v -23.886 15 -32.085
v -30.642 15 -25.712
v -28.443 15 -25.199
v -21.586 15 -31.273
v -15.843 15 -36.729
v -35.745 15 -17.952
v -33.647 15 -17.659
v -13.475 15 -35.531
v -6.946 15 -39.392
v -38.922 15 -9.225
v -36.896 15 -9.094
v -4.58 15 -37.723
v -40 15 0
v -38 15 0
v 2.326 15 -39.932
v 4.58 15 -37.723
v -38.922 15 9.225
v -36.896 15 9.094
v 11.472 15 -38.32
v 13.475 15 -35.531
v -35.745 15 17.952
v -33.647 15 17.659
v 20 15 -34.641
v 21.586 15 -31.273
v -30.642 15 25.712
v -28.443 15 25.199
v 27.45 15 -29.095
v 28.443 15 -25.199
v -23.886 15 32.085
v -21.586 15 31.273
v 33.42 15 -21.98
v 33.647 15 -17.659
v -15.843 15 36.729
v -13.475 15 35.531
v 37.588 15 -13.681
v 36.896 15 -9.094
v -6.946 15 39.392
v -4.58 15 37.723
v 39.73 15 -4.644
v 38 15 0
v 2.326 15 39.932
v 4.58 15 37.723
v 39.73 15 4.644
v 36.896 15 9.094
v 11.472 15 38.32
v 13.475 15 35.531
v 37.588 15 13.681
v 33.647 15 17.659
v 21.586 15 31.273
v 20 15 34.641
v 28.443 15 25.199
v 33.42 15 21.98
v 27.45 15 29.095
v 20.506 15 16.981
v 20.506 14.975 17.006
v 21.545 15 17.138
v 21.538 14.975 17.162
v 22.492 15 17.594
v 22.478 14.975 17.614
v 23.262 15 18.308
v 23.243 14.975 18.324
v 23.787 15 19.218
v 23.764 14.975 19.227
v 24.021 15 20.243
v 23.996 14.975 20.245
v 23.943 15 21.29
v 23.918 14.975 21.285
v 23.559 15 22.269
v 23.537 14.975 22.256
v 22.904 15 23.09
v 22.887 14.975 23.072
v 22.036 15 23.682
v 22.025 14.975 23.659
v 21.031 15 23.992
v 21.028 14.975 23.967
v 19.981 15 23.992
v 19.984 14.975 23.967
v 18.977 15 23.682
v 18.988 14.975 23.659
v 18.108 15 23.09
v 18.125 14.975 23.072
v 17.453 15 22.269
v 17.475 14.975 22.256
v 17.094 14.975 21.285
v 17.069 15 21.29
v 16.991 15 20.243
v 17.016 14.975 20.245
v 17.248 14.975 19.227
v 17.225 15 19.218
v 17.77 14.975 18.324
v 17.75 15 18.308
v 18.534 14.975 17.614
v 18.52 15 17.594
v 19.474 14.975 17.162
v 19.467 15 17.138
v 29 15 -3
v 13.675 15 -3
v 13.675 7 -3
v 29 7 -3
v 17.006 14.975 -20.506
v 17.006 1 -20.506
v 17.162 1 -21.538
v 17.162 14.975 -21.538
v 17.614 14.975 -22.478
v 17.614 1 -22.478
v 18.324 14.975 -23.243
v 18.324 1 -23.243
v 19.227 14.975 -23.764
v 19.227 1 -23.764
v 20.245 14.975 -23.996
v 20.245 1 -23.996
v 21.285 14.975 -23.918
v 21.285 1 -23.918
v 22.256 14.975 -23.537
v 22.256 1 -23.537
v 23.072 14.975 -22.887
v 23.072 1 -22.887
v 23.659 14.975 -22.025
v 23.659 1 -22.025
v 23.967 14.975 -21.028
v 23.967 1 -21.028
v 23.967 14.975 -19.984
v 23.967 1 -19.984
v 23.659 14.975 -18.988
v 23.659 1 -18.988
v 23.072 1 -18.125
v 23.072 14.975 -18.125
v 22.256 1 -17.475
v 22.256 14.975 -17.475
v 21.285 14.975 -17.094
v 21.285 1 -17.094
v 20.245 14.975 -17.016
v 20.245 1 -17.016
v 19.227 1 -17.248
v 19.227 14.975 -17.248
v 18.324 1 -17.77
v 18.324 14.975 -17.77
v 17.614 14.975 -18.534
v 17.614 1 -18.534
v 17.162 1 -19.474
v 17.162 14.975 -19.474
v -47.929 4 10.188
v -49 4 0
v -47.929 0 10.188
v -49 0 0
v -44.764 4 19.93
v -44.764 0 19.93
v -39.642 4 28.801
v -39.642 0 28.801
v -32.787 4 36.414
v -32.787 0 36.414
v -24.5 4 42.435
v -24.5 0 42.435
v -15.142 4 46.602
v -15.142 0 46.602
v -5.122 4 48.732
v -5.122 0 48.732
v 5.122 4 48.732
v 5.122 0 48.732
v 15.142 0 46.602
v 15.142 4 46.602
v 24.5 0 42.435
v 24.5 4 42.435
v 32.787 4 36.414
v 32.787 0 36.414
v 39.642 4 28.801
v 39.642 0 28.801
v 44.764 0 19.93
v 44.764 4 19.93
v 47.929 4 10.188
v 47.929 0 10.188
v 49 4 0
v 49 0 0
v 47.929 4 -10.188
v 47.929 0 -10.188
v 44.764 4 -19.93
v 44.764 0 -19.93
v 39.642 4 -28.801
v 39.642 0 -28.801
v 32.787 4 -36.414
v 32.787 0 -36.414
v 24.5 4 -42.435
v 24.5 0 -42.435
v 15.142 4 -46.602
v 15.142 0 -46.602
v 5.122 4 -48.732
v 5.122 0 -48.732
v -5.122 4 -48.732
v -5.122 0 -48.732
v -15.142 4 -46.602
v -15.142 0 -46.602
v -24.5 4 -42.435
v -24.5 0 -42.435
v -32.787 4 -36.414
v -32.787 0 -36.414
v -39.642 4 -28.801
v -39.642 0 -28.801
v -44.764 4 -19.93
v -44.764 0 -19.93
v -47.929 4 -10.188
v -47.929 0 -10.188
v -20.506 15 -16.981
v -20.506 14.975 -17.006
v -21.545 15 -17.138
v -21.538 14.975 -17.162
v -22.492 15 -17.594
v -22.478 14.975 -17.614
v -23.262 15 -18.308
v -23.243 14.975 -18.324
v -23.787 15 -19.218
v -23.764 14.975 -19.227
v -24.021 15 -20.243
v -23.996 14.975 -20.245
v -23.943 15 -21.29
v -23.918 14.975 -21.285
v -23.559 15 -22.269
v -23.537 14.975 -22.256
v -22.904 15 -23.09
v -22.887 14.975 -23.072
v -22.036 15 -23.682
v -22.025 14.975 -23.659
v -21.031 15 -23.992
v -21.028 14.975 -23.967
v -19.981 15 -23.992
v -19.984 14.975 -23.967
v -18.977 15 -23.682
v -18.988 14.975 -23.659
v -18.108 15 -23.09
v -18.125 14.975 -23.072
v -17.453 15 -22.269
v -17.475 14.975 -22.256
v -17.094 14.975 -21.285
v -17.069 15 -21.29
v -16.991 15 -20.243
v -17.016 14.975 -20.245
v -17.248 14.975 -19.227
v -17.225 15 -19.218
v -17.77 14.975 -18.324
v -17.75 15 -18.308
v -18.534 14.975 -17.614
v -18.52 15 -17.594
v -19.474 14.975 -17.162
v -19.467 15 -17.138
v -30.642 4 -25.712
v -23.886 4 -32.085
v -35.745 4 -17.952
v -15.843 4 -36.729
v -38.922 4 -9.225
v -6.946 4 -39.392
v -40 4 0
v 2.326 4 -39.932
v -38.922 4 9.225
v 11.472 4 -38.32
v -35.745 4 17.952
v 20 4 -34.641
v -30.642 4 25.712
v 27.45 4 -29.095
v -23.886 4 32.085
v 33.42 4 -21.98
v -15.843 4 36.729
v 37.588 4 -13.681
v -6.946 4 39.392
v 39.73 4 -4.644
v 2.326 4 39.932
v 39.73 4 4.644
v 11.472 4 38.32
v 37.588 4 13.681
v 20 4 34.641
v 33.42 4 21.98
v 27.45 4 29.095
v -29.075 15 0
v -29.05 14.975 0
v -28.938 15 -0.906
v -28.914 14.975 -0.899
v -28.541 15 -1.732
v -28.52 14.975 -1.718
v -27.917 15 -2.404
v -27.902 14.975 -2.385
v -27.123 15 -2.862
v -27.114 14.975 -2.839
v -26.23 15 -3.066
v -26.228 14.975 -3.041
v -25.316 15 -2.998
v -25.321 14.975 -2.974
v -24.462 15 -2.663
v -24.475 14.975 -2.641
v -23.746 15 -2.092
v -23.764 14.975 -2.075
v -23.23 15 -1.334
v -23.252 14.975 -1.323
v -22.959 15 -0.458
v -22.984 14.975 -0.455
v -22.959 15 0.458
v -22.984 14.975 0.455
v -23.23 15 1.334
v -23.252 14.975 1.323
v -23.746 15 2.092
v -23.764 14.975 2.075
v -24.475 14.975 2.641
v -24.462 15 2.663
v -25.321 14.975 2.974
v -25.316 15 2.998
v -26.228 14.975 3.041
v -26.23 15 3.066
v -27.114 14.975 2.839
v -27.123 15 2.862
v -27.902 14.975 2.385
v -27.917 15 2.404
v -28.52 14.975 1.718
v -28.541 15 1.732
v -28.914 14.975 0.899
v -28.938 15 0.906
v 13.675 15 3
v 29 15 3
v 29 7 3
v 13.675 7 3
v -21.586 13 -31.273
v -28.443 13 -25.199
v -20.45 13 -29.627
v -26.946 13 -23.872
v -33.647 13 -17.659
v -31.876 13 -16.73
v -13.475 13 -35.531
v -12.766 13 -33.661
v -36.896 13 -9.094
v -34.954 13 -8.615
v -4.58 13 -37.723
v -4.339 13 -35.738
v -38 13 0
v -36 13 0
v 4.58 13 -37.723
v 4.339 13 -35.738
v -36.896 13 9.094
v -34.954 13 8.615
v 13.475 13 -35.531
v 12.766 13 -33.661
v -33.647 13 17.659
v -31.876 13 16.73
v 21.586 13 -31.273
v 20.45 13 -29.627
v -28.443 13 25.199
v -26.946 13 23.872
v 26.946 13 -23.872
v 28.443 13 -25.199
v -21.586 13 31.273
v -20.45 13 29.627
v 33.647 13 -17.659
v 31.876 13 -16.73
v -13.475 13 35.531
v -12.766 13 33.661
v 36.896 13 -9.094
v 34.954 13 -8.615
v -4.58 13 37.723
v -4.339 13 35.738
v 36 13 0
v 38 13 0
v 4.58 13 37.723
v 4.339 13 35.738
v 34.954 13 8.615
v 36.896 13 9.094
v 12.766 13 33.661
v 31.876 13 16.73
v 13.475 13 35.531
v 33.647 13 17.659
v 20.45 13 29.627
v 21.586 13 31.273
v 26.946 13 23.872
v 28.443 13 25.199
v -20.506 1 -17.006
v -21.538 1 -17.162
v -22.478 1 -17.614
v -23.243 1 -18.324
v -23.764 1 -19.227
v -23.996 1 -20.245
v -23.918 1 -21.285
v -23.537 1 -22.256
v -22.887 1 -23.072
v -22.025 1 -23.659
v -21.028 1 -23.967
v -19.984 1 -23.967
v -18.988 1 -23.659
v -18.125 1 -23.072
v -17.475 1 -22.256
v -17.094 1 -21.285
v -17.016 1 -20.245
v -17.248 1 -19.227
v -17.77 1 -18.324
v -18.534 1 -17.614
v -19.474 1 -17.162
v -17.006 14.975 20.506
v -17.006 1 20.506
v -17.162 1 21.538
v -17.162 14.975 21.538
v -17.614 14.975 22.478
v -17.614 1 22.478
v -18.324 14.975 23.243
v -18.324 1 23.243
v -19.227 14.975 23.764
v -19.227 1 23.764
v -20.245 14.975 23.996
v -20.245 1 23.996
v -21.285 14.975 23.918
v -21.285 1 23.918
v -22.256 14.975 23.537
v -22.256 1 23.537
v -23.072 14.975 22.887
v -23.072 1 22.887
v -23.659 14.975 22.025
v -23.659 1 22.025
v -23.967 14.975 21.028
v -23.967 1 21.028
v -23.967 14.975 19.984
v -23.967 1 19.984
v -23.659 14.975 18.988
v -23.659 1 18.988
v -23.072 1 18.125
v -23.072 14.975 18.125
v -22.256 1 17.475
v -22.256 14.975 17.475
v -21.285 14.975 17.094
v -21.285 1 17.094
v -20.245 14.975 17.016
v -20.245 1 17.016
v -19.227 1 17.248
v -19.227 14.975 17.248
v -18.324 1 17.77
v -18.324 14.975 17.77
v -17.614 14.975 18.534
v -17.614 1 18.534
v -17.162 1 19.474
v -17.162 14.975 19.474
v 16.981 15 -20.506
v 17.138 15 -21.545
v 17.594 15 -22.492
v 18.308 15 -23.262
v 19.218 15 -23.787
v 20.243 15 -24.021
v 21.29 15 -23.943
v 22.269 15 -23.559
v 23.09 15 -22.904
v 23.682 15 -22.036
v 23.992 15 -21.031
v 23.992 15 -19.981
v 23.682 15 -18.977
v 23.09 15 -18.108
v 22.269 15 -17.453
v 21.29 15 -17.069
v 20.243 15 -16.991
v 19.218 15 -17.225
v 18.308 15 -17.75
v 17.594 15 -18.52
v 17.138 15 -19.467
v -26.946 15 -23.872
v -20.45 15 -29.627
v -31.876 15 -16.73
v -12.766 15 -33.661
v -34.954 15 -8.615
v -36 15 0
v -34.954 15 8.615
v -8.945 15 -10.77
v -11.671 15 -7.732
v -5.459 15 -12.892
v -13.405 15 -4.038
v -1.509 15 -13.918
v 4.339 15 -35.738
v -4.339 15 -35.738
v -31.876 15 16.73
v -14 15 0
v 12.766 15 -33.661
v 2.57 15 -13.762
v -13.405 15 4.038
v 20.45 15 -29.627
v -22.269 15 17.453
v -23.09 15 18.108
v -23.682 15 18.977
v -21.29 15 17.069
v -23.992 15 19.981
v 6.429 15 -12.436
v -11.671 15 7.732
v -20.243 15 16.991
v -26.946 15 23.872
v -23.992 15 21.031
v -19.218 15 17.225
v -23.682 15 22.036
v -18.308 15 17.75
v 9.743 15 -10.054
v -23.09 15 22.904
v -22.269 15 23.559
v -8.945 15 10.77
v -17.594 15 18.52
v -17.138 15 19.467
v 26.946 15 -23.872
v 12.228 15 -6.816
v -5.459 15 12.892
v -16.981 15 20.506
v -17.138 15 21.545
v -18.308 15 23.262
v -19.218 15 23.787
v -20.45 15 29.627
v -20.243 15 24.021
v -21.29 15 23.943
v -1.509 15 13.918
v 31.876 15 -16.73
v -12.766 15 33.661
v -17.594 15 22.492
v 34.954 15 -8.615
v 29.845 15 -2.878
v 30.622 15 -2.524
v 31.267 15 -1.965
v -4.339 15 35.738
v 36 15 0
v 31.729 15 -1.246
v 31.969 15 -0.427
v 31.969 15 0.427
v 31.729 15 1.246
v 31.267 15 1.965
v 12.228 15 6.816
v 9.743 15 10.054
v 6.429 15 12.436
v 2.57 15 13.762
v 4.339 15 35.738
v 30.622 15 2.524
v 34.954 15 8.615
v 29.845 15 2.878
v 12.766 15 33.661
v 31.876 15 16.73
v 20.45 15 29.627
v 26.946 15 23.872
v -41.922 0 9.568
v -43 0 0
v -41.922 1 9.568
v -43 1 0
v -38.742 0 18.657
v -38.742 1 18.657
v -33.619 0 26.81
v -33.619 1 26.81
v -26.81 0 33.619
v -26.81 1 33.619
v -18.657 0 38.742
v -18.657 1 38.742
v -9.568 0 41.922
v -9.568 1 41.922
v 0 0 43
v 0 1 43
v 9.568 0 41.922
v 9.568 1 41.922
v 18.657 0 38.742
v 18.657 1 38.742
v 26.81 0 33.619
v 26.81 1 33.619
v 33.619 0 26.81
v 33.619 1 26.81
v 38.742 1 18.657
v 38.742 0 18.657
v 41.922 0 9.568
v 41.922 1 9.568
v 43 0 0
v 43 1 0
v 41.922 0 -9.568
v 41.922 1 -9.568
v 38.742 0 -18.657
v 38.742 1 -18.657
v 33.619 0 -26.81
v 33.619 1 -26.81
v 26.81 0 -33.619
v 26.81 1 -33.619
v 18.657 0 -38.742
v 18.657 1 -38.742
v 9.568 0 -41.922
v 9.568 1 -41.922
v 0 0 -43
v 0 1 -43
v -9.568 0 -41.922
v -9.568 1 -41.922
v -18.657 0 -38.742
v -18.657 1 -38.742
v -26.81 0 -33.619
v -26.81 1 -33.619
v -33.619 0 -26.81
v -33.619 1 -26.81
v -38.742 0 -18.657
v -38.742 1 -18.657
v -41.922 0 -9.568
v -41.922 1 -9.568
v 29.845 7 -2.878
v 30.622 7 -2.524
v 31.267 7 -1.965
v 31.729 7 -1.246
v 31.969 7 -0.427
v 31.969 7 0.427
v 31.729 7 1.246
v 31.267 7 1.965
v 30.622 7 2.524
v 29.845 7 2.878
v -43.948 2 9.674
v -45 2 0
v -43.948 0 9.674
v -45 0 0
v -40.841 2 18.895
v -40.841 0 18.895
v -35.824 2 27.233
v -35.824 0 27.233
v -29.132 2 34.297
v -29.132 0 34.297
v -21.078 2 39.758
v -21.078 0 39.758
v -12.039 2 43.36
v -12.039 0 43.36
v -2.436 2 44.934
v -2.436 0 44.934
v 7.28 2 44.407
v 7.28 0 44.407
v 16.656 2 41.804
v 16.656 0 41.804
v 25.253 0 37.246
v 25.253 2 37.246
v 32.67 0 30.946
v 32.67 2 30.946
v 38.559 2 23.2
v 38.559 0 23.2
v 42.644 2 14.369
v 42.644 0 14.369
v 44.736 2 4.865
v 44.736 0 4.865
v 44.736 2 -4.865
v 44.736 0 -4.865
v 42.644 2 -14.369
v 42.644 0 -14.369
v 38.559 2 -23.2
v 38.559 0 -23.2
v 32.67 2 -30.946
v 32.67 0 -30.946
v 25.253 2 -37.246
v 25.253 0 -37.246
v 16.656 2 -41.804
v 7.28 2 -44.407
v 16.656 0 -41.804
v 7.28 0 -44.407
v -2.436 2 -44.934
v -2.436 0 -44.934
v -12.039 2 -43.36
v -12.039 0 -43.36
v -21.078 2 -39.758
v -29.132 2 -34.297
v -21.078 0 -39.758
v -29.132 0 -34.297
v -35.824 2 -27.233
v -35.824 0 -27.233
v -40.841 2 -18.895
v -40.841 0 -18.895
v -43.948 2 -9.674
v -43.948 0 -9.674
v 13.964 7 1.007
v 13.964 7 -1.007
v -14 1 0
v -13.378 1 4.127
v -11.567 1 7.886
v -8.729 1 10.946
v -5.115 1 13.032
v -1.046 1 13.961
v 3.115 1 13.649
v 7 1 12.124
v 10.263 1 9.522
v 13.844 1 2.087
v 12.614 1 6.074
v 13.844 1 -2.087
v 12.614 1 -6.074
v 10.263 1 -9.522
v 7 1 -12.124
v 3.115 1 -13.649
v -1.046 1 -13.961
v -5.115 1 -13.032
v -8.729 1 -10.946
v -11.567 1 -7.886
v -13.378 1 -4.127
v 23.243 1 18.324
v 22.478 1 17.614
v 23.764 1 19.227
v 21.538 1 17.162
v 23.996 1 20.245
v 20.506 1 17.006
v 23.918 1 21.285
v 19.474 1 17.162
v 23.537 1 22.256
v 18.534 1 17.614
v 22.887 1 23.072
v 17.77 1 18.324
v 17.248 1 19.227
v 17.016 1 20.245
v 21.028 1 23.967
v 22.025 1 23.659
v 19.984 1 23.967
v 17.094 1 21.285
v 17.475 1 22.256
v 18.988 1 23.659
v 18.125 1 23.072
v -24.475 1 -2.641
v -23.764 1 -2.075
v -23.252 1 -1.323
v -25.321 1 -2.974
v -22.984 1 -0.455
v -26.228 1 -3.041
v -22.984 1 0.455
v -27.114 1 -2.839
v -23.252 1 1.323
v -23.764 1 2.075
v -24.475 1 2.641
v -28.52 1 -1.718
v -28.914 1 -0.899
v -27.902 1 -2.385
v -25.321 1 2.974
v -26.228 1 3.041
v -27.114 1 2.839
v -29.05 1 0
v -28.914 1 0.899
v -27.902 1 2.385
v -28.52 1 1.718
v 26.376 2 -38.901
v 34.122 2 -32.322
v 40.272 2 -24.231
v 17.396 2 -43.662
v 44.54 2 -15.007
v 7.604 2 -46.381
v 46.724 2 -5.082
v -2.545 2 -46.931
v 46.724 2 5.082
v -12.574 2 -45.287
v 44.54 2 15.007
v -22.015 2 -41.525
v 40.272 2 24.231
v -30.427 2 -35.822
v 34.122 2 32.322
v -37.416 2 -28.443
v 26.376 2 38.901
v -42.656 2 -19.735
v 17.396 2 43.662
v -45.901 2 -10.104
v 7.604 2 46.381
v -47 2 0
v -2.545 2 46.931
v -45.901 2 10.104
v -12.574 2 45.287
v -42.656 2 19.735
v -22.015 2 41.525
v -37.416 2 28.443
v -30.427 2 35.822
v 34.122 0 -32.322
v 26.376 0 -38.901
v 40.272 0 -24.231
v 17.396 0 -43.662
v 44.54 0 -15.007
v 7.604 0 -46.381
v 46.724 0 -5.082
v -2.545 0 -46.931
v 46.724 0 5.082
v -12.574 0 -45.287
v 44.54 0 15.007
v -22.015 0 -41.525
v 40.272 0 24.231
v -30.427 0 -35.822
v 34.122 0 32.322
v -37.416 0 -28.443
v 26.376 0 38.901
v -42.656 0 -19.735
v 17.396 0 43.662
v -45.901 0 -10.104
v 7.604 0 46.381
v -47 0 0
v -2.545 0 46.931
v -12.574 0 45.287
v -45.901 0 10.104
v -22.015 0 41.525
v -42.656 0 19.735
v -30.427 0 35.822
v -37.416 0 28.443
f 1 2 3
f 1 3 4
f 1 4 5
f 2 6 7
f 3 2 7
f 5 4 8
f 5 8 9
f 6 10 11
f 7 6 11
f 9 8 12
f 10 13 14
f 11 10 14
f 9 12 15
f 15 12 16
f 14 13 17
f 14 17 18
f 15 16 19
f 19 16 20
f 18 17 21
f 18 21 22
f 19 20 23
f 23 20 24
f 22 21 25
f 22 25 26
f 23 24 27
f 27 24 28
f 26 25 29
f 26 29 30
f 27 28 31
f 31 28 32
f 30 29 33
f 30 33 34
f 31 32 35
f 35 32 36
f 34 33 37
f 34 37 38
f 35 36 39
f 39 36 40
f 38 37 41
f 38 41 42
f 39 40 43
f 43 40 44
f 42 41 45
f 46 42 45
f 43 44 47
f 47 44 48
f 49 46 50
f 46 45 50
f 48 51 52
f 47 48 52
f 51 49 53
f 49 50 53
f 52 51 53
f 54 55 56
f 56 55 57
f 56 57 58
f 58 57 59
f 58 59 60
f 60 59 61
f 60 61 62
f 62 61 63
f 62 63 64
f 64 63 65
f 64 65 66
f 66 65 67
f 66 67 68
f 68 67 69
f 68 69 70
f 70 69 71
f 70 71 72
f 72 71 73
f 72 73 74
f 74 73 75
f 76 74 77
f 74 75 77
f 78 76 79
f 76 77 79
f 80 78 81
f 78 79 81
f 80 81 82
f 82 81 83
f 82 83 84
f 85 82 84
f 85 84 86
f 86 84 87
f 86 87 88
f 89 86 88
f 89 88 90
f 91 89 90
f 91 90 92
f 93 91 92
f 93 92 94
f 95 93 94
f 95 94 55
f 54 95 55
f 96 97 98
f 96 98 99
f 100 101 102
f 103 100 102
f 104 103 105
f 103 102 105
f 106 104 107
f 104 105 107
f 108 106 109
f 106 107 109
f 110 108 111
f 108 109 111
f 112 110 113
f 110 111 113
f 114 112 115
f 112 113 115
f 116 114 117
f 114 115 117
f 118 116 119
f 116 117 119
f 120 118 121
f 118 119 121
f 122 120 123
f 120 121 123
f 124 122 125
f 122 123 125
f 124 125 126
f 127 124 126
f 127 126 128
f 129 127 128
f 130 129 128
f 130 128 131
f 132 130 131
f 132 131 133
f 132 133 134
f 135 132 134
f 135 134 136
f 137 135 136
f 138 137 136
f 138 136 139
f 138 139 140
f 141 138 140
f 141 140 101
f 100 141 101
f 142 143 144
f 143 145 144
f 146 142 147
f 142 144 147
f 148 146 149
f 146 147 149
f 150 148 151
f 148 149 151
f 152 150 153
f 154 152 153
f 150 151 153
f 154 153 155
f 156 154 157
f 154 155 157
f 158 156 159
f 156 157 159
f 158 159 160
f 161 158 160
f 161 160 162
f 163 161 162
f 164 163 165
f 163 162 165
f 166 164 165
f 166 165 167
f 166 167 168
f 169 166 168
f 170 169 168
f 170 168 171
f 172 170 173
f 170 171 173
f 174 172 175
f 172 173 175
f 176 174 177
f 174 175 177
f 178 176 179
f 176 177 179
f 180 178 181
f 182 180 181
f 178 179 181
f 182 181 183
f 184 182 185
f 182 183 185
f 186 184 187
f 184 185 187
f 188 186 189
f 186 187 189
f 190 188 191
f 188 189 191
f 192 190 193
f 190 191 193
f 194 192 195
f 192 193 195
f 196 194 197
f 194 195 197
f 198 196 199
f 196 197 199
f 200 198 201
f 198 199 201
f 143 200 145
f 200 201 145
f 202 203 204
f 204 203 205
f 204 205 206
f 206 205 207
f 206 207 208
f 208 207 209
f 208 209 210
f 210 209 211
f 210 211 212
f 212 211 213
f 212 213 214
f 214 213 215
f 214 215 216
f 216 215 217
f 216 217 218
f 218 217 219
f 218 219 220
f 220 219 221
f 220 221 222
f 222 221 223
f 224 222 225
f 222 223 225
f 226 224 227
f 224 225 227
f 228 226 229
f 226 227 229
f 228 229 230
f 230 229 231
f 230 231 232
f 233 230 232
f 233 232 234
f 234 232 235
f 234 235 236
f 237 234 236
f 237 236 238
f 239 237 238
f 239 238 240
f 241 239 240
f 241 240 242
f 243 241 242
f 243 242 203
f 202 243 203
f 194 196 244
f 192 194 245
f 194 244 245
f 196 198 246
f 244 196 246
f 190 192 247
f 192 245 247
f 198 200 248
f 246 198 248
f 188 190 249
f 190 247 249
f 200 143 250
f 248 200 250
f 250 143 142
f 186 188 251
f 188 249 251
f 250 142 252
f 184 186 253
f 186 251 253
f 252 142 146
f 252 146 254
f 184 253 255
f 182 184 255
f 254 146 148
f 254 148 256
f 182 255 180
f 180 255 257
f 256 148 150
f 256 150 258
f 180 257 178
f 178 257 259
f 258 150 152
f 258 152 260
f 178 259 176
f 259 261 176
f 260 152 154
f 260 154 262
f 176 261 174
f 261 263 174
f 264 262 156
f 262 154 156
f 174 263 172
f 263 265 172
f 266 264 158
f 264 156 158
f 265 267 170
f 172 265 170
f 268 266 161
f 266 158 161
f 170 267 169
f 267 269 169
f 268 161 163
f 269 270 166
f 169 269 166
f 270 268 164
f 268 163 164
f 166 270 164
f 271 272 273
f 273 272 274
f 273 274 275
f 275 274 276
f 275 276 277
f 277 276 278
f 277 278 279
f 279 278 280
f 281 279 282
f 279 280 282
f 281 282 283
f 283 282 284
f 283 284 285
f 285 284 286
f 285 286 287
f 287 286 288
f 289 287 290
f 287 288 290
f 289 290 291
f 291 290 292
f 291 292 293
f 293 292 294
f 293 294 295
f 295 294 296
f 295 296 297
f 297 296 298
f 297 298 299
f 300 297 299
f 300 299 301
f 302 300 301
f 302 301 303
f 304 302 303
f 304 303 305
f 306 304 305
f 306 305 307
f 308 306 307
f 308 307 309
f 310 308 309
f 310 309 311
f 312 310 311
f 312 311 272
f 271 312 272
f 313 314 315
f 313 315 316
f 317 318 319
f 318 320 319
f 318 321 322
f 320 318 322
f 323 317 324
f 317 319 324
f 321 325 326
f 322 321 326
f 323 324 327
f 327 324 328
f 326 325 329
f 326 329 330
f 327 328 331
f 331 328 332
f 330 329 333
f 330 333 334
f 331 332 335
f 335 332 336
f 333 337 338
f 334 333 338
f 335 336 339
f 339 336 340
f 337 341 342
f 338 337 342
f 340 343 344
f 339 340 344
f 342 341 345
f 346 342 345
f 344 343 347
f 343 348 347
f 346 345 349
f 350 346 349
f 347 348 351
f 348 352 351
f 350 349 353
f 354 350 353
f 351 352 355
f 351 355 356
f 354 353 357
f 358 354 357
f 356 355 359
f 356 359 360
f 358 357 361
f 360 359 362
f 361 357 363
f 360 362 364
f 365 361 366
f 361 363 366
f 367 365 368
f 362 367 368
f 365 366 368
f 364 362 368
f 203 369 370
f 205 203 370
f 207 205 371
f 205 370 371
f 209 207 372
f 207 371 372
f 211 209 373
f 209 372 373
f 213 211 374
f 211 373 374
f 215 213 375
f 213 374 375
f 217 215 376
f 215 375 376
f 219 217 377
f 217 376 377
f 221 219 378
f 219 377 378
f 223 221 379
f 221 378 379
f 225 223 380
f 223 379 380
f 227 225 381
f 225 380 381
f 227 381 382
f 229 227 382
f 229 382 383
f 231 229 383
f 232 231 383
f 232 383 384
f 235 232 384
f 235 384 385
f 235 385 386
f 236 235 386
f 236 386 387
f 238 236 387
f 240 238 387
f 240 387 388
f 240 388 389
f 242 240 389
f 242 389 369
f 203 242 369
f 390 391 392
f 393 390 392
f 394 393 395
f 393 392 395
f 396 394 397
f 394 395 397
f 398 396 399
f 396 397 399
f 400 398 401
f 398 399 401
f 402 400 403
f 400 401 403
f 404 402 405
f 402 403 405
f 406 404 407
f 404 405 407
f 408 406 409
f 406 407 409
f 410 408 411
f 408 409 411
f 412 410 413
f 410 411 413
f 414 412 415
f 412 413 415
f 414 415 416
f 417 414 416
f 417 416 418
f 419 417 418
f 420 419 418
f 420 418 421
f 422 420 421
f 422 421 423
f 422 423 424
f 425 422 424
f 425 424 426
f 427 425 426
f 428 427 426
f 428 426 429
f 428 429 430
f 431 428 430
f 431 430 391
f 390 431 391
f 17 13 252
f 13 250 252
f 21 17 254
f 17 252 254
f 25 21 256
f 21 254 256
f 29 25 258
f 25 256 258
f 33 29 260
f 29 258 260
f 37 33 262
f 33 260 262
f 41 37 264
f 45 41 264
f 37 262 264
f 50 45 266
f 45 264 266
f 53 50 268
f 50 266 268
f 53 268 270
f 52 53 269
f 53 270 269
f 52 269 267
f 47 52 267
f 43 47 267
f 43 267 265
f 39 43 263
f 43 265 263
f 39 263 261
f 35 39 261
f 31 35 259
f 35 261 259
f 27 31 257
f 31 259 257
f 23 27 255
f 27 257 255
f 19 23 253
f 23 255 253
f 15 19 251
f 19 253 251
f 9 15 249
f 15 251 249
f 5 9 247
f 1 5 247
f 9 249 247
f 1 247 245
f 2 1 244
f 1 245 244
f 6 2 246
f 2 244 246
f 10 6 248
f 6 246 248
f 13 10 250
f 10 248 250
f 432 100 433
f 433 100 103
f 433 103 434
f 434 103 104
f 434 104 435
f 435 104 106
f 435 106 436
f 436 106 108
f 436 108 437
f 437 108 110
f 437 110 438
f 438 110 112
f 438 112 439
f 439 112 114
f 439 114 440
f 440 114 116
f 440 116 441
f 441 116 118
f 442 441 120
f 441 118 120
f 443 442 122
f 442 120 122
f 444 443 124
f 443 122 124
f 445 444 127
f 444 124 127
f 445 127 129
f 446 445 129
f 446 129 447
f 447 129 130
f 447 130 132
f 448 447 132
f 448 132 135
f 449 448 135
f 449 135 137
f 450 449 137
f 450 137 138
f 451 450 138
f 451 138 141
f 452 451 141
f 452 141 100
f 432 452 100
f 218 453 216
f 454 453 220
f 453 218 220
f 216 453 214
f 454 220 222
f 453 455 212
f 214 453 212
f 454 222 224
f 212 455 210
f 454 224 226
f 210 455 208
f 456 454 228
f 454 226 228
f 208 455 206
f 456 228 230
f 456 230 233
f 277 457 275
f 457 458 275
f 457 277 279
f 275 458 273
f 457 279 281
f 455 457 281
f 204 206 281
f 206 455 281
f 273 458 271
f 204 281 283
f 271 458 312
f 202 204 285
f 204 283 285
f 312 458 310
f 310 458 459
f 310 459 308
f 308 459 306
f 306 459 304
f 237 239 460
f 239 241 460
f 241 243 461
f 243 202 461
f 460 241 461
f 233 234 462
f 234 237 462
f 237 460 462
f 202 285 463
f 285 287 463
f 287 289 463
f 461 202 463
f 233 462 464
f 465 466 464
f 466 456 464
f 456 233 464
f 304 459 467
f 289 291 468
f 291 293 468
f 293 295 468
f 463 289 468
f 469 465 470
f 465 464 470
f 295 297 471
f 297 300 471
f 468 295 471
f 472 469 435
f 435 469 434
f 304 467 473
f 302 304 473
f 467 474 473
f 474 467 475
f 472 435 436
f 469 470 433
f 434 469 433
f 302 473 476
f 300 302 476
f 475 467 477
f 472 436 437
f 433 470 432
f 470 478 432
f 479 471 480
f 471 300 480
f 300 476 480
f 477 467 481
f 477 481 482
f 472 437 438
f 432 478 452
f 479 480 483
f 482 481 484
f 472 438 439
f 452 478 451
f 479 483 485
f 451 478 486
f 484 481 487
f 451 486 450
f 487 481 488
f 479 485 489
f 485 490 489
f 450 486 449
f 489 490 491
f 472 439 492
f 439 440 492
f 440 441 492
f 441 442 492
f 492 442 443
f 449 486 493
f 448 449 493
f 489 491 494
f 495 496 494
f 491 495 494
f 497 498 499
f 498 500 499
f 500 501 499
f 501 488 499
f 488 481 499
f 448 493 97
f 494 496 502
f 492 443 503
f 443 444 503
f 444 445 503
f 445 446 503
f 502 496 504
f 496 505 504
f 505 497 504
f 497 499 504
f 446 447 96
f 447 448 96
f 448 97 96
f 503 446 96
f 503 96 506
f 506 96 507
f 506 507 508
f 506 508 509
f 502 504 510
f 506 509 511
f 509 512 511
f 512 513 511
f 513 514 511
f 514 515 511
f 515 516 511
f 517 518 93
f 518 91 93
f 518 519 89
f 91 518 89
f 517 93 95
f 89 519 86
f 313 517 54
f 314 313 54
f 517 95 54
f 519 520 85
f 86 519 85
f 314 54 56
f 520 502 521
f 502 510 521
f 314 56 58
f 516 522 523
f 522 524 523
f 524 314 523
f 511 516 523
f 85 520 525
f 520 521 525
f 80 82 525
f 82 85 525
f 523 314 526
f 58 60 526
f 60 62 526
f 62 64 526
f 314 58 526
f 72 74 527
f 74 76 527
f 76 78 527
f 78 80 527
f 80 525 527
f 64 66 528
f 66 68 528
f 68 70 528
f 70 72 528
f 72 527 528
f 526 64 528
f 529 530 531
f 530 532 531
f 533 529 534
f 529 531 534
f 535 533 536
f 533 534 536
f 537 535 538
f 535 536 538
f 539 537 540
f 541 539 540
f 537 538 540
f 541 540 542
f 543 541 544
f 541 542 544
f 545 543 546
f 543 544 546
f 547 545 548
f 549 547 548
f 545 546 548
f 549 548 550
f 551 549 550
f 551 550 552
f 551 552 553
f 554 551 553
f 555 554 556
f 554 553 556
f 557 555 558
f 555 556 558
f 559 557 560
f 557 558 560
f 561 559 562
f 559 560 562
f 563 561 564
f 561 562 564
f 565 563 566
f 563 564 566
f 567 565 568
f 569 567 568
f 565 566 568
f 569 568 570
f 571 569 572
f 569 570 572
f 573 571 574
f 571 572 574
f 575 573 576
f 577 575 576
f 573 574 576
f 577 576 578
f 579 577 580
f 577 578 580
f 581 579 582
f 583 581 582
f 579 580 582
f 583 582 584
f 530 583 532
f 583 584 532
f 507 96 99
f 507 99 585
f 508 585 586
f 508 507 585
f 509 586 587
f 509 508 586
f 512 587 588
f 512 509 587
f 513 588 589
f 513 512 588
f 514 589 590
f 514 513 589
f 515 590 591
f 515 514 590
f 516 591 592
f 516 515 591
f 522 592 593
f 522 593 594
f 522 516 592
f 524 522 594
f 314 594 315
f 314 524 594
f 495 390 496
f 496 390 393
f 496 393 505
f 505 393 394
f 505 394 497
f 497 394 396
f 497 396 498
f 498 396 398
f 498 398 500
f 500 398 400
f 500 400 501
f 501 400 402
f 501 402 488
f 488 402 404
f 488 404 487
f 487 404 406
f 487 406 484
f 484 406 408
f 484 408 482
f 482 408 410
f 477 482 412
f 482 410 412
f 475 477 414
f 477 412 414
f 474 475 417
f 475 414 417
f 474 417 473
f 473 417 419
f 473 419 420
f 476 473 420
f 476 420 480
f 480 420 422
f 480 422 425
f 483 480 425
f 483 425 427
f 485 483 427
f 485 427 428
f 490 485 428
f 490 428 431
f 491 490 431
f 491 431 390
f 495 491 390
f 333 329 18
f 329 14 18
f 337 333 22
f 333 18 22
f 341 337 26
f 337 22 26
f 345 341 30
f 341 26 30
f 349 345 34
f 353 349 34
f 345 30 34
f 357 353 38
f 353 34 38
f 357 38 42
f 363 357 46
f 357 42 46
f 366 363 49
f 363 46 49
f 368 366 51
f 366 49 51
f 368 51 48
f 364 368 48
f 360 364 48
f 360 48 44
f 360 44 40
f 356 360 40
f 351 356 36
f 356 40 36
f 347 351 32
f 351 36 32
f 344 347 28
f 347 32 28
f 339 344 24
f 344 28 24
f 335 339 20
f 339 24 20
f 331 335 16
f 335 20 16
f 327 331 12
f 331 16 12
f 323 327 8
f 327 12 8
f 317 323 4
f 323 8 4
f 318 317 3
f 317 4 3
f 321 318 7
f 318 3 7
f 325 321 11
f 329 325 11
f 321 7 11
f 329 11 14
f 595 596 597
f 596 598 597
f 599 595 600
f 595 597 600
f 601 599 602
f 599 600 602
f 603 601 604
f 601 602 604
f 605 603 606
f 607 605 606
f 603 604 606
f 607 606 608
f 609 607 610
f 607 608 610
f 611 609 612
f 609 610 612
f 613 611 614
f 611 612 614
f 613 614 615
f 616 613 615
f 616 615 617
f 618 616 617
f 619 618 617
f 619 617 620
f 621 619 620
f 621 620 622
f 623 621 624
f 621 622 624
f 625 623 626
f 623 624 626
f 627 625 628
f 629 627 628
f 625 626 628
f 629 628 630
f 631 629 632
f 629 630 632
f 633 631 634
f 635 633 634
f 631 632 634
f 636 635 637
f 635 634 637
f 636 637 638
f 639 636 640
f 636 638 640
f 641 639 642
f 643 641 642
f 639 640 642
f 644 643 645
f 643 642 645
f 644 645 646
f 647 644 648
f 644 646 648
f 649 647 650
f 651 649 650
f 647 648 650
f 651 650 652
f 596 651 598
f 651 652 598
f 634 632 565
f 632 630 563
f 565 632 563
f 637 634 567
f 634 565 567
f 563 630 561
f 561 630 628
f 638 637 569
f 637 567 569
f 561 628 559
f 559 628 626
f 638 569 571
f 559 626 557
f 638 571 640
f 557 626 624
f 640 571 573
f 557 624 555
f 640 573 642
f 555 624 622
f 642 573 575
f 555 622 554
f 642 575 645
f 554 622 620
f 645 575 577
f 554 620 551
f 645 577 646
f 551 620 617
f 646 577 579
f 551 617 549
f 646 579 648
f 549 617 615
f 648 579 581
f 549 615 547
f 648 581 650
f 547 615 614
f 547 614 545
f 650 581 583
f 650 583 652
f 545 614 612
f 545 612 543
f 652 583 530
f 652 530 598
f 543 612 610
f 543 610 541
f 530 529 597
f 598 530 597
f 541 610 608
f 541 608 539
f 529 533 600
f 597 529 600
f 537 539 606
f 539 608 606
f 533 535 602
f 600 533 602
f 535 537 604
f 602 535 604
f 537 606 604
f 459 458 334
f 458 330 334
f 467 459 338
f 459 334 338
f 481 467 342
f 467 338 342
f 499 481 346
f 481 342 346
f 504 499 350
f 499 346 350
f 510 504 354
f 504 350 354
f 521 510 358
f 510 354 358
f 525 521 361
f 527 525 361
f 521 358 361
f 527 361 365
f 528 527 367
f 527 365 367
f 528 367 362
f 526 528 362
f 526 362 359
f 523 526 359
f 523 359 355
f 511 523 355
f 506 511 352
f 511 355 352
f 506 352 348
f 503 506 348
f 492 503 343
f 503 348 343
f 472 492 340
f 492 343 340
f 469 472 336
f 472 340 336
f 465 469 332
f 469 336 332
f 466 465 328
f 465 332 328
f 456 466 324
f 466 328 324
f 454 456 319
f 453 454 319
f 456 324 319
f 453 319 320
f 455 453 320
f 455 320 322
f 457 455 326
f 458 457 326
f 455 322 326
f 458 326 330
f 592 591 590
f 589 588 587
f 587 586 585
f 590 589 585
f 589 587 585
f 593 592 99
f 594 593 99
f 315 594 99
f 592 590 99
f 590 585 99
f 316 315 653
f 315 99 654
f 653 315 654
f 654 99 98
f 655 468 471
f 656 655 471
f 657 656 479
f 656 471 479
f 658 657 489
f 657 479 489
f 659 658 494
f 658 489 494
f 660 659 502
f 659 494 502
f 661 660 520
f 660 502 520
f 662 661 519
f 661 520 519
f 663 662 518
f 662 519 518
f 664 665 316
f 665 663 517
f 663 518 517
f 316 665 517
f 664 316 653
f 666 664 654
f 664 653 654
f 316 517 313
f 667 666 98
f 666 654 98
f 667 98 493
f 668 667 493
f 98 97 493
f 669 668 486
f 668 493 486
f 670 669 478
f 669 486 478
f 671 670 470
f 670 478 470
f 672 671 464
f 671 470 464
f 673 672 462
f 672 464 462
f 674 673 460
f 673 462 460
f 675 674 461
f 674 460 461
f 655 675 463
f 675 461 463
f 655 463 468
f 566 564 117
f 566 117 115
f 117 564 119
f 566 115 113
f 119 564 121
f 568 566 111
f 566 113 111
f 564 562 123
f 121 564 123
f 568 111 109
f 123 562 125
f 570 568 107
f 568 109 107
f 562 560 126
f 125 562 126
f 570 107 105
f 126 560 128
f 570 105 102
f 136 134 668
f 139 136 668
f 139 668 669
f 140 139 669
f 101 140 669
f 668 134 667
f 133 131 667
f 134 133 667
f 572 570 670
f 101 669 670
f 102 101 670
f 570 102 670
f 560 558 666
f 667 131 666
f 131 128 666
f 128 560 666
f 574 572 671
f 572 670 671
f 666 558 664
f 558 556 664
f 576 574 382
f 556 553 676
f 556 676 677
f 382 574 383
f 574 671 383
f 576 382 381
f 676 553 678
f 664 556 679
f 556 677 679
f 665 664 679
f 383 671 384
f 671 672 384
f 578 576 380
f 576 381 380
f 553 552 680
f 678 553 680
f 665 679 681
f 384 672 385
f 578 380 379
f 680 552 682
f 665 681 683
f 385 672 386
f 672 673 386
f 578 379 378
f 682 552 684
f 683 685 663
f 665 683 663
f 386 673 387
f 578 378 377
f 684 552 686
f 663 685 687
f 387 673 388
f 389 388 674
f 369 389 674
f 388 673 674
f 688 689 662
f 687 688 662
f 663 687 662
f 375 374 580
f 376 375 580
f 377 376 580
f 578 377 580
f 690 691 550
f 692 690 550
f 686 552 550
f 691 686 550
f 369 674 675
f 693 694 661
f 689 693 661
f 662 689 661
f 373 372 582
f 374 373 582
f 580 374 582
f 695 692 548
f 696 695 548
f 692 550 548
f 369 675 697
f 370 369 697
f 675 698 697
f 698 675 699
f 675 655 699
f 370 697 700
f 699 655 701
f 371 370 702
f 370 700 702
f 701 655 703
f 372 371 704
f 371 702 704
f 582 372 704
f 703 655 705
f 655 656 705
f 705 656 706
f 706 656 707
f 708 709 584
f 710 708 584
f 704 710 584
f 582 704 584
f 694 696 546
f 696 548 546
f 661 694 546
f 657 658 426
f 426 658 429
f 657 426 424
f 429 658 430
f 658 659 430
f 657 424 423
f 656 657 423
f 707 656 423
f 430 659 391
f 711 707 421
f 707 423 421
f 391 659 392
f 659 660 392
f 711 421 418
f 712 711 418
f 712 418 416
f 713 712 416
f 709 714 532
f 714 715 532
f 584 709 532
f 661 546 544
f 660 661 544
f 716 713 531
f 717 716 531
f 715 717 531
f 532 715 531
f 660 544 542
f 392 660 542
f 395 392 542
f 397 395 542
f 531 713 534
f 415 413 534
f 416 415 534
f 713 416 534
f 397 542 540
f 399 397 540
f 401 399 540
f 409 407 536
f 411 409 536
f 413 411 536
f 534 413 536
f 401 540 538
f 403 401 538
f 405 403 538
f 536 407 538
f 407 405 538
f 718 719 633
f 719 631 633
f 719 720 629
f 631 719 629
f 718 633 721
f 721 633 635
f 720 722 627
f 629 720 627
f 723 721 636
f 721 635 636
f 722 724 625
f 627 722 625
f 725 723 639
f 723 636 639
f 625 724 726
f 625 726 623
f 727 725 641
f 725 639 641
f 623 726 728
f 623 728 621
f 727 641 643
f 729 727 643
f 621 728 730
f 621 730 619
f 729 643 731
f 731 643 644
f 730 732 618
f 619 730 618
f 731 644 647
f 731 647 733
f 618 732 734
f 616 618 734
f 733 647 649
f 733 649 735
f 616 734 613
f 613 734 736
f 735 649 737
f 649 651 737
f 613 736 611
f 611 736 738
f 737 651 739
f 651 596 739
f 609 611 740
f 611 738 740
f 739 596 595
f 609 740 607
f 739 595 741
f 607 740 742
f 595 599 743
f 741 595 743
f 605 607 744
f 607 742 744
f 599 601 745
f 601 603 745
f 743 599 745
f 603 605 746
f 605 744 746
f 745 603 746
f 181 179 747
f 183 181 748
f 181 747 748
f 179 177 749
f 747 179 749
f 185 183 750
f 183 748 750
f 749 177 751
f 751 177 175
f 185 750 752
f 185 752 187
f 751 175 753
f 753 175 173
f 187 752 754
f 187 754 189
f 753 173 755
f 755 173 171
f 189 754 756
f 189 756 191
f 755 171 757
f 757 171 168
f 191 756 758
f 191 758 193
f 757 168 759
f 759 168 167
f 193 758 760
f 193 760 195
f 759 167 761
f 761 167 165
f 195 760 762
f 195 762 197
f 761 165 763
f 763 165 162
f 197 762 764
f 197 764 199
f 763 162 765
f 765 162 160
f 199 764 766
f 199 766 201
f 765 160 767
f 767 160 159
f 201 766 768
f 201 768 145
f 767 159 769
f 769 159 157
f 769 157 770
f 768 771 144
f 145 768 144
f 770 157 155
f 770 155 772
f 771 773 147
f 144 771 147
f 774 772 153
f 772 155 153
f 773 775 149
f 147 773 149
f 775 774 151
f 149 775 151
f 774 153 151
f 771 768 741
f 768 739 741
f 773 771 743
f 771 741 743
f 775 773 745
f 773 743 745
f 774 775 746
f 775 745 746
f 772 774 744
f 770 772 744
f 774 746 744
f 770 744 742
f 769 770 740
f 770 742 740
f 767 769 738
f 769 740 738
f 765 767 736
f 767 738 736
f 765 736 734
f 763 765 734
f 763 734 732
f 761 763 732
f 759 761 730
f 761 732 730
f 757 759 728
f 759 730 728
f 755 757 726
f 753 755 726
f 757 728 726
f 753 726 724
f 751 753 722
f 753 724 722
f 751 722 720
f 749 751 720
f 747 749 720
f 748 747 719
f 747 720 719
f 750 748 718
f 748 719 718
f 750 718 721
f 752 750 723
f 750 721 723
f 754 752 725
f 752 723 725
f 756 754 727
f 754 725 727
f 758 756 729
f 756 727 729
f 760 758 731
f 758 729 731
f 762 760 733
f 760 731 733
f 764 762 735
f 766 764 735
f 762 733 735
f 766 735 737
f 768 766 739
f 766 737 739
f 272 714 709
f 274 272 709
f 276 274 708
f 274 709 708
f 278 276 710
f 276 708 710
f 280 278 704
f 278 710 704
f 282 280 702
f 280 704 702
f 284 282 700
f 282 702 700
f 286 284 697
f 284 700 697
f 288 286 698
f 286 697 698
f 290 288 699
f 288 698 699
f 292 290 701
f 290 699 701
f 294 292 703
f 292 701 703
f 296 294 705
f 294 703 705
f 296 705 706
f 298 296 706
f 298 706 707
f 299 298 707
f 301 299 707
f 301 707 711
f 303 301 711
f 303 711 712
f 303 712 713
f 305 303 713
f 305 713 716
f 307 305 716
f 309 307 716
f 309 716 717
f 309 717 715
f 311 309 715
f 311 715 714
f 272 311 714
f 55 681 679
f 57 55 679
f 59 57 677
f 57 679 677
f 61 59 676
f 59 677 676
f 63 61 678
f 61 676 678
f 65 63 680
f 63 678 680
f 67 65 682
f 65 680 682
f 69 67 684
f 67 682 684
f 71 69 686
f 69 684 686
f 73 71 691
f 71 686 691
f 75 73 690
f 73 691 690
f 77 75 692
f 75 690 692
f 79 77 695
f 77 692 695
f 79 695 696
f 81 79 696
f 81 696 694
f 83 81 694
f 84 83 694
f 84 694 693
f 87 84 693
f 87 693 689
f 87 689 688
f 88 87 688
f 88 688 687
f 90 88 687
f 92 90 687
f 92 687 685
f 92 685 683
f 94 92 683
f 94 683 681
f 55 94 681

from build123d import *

# Parameters (mm, degrees)
CUT_EXTRUDE1_DEPTH                   = 8
M6_CLEARANCE_HOLE1_D                 = 7
M6_CLEARANCE_HOLE1_DEPTH             = 14
M6_CLEARANCE_HOLE1_CSINK_D           = 7.05
M6_CLEARANCE_HOLE1_CSINK_ANGLE       = 90
CIRPATTERN1_COUNT                    = 4
F_6_1_6_1_DIAMETER_HOLE1_D           = 6.1
F_6_1_6_1_DIAMETER_HOLE1_DEPTH       = 14
F_6_1_6_1_DIAMETER_HOLE1_CSINK_D     = 6.15
F_6_1_6_1_DIAMETER_HOLE1_CSINK_ANGLE = 90


with BuildPart() as part:
    # Sketch1 → Revolve1 (revolve)
    with BuildSketch(Plane.XY):
        Polygon((-14, 1), (-14, 15), (-36, 15), (-36, 13), (-38, 13), (-38, 15), (-40, 15), (-40, 4), (-49, 4), (-49, 0), (-47, 0), (-47, 2), (-45, 2), (-45, 0), (-43, 0), (-43, 1), align=None)
    revolve(axis=Axis((0, 0, 0), (0, 1, 0)))

    # Sketch2 → Cut-Extrude1 (cut)
    with BuildSketch(Plane(origin=(0, 15, 0), x_dir=(1, 0, 0), z_dir=(0, 1, 0))):
        with BuildLine():
            Line((0, 3), (29, 3))
            ThreePointArc((29, 3), (32, 0), (29, -3))
            Line((29, -3), (0, -3))
            ThreePointArc((0, -3), (-3, 0), (0, 3))
        make_face()
    extrude(amount=-CUT_EXTRUDE1_DEPTH, mode=Mode.SUBTRACT)

    # M6 Clearance Hole1
    with Locations(Plane(origin=(0, 15, 0), x_dir=(1, 0, 0), z_dir=(0, 1, 0))):
        with Locations((20.506096654, 20.506096654)):
            m6_clearance_hole1 = CounterSinkHole(M6_CLEARANCE_HOLE1_D / 2, M6_CLEARANCE_HOLE1_CSINK_D / 2, depth=M6_CLEARANCE_HOLE1_DEPTH, counter_sink_angle=M6_CLEARANCE_HOLE1_CSINK_ANGLE)

    # CirPattern1: M6 Clearance Hole1 ×4 about axis
    cirpattern1_axis = Axis((0, 0, 0), (0, 1, 0))
    for i in range(1, CIRPATTERN1_COUNT):
        add(m6_clearance_hole1.rotate(cirpattern1_axis, i * 360 / CIRPATTERN1_COUNT), mode=Mode.SUBTRACT)

    # Ø6.1 (6.1) Diameter Hole1
    with Locations(Plane(origin=(0, 15, 0), x_dir=(1, 0, 0), z_dir=(0, 1, 0))):
        with Locations((-26, 0)):
            CounterSinkHole(F_6_1_6_1_DIAMETER_HOLE1_D / 2, F_6_1_6_1_DIAMETER_HOLE1_CSINK_D / 2, depth=F_6_1_6_1_DIAMETER_HOLE1_DEPTH, counter_sink_angle=F_6_1_6_1_DIAMETER_HOLE1_CSINK_ANGLE)


solid = part.part
